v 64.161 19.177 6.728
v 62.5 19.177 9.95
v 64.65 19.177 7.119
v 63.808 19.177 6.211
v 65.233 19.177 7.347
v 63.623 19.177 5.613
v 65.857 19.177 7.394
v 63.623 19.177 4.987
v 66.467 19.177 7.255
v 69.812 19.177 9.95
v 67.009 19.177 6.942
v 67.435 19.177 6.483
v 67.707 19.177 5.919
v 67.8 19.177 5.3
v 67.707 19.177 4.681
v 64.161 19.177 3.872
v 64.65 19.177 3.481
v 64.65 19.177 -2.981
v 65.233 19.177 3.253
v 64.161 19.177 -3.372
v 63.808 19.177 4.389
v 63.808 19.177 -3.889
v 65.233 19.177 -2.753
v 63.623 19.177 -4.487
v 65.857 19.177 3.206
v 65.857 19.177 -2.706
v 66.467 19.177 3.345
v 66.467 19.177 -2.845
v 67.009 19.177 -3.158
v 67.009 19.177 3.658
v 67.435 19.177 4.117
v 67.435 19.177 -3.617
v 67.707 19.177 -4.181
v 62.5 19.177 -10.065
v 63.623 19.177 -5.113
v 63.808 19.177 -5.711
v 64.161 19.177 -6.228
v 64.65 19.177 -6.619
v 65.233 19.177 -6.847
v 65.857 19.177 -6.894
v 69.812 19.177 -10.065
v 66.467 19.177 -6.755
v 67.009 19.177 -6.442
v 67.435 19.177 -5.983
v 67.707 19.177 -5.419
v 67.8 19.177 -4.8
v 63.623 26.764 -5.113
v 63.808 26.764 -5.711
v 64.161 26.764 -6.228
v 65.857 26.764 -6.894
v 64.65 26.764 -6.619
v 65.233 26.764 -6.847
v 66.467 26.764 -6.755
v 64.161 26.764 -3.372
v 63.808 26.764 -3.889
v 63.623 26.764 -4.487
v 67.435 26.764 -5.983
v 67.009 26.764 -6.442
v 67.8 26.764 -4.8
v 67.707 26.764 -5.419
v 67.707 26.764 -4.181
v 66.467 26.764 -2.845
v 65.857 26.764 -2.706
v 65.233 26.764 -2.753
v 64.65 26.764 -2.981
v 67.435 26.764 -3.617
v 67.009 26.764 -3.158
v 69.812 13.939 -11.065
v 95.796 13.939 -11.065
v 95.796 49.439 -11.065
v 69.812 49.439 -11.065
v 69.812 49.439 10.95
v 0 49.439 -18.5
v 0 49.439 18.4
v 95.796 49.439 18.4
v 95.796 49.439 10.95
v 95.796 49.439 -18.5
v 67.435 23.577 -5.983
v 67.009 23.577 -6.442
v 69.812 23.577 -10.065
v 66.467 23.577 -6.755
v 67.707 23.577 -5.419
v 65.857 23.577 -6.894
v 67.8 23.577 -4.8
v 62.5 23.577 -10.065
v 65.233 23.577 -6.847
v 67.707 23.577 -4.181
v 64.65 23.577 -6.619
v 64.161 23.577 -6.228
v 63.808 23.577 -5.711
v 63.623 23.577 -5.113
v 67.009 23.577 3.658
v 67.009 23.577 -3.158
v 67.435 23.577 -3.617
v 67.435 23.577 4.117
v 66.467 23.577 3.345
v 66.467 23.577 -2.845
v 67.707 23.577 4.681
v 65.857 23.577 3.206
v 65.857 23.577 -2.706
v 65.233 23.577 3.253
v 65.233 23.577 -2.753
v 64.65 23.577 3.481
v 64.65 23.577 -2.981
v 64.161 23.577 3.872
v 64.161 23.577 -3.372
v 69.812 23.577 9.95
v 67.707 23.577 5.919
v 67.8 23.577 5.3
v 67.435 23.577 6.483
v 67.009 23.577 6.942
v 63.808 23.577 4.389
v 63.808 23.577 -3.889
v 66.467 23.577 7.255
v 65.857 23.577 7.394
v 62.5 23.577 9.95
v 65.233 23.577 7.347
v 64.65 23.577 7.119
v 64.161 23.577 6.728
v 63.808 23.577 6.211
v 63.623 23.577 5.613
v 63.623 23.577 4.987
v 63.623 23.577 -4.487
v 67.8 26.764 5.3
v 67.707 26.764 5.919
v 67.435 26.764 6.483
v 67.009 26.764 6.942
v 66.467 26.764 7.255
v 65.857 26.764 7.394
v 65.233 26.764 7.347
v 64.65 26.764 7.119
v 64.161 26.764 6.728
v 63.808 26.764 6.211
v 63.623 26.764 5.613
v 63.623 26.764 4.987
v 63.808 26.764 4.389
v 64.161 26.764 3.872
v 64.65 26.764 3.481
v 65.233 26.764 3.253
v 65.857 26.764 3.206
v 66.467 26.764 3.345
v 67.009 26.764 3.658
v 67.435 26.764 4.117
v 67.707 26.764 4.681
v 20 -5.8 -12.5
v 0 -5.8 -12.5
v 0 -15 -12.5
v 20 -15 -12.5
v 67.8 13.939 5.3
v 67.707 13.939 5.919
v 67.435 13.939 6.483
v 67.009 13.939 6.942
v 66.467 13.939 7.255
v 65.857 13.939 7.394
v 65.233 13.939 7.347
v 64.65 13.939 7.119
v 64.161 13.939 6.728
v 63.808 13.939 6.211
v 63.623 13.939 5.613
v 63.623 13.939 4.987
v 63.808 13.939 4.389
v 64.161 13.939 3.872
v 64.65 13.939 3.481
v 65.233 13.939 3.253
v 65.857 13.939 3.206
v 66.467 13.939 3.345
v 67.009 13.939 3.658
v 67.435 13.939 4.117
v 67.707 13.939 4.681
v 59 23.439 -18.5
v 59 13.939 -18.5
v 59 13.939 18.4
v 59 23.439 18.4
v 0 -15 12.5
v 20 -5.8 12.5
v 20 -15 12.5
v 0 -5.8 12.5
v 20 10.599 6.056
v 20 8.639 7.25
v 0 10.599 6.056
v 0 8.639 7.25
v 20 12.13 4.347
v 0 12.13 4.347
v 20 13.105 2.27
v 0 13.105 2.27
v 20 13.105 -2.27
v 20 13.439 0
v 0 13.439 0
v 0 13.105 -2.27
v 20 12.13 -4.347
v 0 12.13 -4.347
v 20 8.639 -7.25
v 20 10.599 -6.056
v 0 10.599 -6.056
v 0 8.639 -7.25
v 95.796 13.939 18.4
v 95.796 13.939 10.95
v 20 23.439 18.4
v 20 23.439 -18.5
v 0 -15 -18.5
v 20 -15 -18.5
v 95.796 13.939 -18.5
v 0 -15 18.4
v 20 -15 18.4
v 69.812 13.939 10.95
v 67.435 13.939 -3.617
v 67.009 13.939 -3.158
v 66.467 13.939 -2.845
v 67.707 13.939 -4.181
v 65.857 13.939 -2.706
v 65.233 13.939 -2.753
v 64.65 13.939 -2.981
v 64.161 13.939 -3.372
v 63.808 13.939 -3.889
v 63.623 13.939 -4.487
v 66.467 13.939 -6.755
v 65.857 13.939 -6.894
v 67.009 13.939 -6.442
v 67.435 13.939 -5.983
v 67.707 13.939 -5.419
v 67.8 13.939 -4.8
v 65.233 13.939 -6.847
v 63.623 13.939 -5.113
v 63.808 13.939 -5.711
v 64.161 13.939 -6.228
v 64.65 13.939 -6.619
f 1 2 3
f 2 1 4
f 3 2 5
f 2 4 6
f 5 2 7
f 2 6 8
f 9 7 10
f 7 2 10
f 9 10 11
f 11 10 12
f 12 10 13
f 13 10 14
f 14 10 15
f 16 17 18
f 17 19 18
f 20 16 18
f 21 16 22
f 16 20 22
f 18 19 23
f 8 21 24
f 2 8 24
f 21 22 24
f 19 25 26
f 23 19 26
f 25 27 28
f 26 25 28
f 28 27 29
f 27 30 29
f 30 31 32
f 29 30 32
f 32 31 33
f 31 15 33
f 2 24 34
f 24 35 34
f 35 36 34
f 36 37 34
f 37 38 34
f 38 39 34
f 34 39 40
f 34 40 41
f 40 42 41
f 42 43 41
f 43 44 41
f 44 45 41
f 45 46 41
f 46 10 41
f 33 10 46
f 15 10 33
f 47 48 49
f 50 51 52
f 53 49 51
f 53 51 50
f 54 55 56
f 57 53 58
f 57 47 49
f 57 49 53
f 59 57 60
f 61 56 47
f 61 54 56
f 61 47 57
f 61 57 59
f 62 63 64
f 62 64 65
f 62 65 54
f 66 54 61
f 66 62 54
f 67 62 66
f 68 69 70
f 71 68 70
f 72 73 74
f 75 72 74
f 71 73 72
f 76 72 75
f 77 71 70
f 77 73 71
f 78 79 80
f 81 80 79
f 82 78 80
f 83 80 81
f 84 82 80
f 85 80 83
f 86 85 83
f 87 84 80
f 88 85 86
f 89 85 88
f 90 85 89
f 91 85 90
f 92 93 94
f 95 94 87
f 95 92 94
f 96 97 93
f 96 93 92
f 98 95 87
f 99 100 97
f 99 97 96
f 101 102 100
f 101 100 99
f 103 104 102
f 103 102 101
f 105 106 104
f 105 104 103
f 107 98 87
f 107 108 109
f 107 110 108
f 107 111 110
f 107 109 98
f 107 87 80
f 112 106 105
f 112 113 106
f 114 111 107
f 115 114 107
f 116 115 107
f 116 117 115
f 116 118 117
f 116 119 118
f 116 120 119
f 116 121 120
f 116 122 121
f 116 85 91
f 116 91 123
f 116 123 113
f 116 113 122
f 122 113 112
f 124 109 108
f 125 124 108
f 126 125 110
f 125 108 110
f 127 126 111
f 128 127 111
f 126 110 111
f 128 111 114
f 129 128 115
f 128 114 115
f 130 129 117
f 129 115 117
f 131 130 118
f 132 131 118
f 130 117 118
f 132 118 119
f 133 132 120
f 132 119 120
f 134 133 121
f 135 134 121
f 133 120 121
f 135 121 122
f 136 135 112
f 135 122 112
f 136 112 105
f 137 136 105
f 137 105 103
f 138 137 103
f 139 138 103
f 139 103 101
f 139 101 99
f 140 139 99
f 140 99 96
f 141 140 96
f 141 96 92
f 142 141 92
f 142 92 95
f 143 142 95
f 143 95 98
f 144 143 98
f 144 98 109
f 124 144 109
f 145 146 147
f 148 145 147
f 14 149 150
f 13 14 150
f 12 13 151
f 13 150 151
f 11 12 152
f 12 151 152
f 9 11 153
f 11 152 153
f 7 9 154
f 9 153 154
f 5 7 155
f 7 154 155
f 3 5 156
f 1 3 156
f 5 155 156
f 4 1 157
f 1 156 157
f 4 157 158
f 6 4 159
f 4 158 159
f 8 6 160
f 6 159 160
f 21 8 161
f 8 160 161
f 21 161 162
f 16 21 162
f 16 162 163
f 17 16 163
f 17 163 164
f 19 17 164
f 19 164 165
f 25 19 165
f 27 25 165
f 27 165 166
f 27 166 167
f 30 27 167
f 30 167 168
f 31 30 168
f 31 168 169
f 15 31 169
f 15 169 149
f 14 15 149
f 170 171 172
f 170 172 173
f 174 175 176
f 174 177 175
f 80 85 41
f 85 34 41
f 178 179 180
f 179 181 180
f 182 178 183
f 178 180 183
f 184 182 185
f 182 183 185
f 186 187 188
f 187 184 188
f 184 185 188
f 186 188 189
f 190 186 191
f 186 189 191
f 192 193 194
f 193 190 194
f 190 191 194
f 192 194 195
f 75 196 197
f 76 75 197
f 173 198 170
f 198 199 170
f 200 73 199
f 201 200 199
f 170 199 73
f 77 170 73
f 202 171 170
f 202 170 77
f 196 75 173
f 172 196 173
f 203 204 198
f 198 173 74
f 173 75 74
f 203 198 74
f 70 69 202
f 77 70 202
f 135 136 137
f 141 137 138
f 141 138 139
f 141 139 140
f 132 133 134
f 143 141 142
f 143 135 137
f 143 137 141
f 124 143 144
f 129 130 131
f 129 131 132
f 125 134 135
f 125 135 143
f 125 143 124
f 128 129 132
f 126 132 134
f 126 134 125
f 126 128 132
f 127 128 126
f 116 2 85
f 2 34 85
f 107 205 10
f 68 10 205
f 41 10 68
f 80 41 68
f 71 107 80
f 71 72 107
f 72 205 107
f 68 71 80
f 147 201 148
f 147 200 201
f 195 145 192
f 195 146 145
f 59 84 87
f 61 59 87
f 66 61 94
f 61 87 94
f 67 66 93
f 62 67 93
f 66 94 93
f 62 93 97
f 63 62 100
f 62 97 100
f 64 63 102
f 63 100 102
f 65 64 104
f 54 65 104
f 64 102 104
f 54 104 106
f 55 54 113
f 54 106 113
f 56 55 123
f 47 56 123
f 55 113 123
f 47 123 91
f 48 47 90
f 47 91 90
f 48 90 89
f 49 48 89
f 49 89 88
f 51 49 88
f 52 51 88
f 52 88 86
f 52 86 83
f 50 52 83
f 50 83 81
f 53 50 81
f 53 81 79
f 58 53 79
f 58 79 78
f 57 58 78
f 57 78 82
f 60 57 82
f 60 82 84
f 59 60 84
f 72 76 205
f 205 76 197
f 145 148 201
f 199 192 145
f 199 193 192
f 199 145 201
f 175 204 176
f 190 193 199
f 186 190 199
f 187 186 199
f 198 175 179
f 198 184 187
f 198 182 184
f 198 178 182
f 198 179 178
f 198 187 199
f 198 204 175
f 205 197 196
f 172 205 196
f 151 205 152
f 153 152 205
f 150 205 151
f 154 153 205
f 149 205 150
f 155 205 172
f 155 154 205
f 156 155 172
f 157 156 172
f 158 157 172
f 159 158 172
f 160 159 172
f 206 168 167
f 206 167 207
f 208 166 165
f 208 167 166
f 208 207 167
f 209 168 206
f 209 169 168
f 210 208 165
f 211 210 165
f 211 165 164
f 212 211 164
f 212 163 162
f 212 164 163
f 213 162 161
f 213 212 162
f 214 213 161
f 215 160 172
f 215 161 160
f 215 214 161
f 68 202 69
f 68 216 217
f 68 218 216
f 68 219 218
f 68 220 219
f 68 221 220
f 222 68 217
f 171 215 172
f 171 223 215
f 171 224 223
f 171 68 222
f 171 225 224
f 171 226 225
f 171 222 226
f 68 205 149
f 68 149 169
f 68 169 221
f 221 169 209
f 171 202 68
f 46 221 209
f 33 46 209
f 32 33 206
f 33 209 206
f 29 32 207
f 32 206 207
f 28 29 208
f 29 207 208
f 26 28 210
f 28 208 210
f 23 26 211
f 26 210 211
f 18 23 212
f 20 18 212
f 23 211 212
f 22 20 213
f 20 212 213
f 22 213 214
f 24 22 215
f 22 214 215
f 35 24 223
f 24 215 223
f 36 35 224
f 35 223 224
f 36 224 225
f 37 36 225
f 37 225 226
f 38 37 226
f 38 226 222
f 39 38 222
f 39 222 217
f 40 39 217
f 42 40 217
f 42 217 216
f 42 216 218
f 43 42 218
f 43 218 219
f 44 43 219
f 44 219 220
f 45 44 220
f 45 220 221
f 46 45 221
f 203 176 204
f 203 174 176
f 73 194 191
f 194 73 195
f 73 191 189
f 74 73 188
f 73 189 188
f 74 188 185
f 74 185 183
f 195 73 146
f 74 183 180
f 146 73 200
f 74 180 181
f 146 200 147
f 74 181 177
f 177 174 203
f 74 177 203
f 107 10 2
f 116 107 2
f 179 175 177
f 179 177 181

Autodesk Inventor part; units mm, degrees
ref_plane "YZ Plane" through (0, 0, 0) normal (1, 0, 0) x (0, 1, 0)
ref_plane "XZ Plane" through (0, 0, 0) normal (0, 1, 0) x (-1, 0, 0)
ref_plane "XY Plane" through (0, 0, 0) normal (0, 0, 1) x (1, 0, 0)
sketch "Sketch1" plane through (0, 0, 0) normal (1, 0, 0) x (0, 1, 0)
  line L0 (-5.8, 12.5) -> (-15, 12.5)
  line L1 (-5.8, -12.5) -> (-15, -12.5)
  line L2 (-5.8, 12.5) -> (8.6392, 7.25)
  line L3 (-5.8, -12.5) -> (8.6392, -7.25)
  arc A0 (8.6392, -7.25) -> (8.6392, 7.25) centre (5.5639, 0) ccw
  line L4 (-15, 12.5) -> (-15, 18.5)
  line L5 (-15, 18.5) -> (23.4392, 18.5)
  line L6 (23.4392, 18.5) -> (23.4392, -18.5)
  line L7 (23.4392, -18.5) -> (-15, -18.5)
  line L8 (-15, -18.5) -> (-15, -12.5)
  line L9 (23.4392, 0) -> (13.4392, 0) construction
  line L10 (13.4392, 0) -> (0, 0) construction
  line L11 (8.6392, -7.25) -> (8.6392, 0) construction
  line L12 (8.6392, 0) -> (8.6392, 7.25) construction
  point P0 (-10.4, 12.5)
  dimension "d0" = 9.2
  dimension "d1" = 25
  dimension "d2" = 12.5
  dimension "d7" = 9.2
  dimension "d8" = 12.5
  dimension "d9" = 15
  dimension "d10" = 15
  dimension "d14" = 6
  dimension "d15" = 6
  dimension "d16" = 37
  dimension "d29" = 10
  dimension "d88" = 4.8
  dimension "d90" = 14.5
  dimension "d91" = 23.4392
extrude "Extrusion1" add sketch "Sketch1" along normal blind 20
sketch "Sketch2" plane through (0, 23.4392, 18.5) normal (0, 1, 0) x (1, 0, 0)
  line L0 (0, 31) -> (0, 37) projected
  line L1 (0, 37) -> (70, 37)
  line L2 (70, 37) -> (70, 0.0995)
  line L3 (70, 0.0995) -> (0, 0.0995)
  line L4 (0, 0.0995) -> (0, 37)
  line L5 (20, 37) -> (20, 0) projected
  point P0 (0, 18.5)
  point P1 (70, 18.5498)
  dimension "d19" = 50
extrude "Extrusion2" add sketch "Sketch2" along normal blind 10
sketch "Sketch3" plane through (0, 23.4392, 18.5) normal (0, -1, 0) x (1, 0, 0)
  line L0 (110.5, -8.5498) -> (110.5, -28.5498)
  line L1 (110.5, -28.5498) -> (70, -28.5498)
  line L2 (70, -28.5498) -> (70, -8.5498)
  line L3 (70, -0.0995) -> (70, -37) projected
  line L4 (110.5, -8.5498) -> (119.5, -8.5498)
  line L5 (119.5, -8.5498) -> (119.5, -37)
  line L6 (119.5, -37) -> (70, -37)
  line L7 (70, -37) -> (0, -37) projected
  line L8 (70, -37) -> (59, -37)
  line L9 (59, -37) -> (59, -8.5498)
  line L10 (59, -8.5498) -> (70, -8.5498)
  point P0 (0, -18.5)
  point P1 (70, -18.5498)
  point P2 (70, -18.5498)
  point P3 (110.5, -18.5498)
  dimension "d22" = 20
  dimension "d23" = 20
  dimension "d24" = 0
  dimension "d25" = 40.5
  dimension "d26" = 9
  dimension "d30" = 11
extrude "Extrusion3" add sketch "Sketch3" along normal blind 9.5 and the other way blind 10
sketch "Sketch4" plane through (0, 33.4392, 18.5) normal (0, 1, 0) x (1, 0, 0)
  line L0 (110.5, 8.5498) -> (119.5, 8.5498) projected
  line L1 (62.5, 28.5653) -> (119.5, 28.5653)
  line L2 (119.5, 28.5653) -> (119.5, 8.5498)
  line L3 (119.5, 8.5498) -> (62.5, 8.5498)
  line L4 (62.5, 8.5498) -> (62.5, 28.5653)
  line L5 (70, 0.0995) -> (70, 28.5498) projected
  line L6 (110.5, 28.5498) -> (110.5, 8.5498) projected
  point P0 (0, 18.5)
  point P1 (70, 14.3246)
  point P2 (110.5, 8.5498)
  dimension "d33" = 7.5
  dimension "d34" = 9
extrude "Extrusion4" cut sketch "Sketch4" against normal blind 14.2625
sketch "Sketch5" plane through (0, 33.4392, 18.5) normal (0, 1, 0) x (1, 0, 0)
  line L0 (62.5, 8.5498) -> (62.5, 28.5653) projected
  line L1 (62.5, 8.5498) -> (70, 8.5498)
  line L2 (70, 8.5498) -> (70, -1.0168)
  line L3 (70, -1.0168) -> (62.5, -1.0168)
  line L4 (62.5, -1.0168) -> (62.5, 8.5498)
  line L5 (70, 0.0995) -> (70, 8.5498) projected
  point P0 (0, 18.5)
  dimension "d47" = 0
extrude "Extrusion5" cut sketch "Sketch5" against normal blind 14.2625
sketch "Sketch7" plane through (59, 13.9392, 9.9502) normal (0, 0, 1) x (1, 0, 0)
  line L0 (3.5, 5.2375) -> (3.5, 9.5) projected
  line L1 (11, 0) -> (11, 5.2375) projected
  line L2 (3.5, 5.2375) -> (11, 5.2375)
  line L3 (11, 5.2375) -> (11, 0)
  line L4 (11, 0) -> (0, 0)
  line L5 (0, 0) -> (0, 9.5)
  line L6 (0, 9.5) -> (3.5, 9.5)
  line L7 (-39, 9.5) -> (3.5, 9.5) projected
  line L8 (3.5, 9.5) -> (3.5, 19.5) projected
  point P0 (-59, -13.9392)
  dimension "d42" = 11
  dimension "d43" = 0
  dimension "d44" = 0
extrude "Extrusion7" add sketch "Sketch7" along normal blind 8.45
sketch "Sketch8" plane through (62.5, 33.4392, 18.4005) normal (1, 0, 0) x (0, 0, -1)
  line L0 (28.4658, 0) -> (28.4658, -14.2625) projected
  line L1 (36.9005, 0) -> (0, 0) projected
  line L2 (28.4658, -9.8625) -> (0, -9.8625)
  line L3 (0, -9.8625) -> (0, 0)
  line L4 (0, 0) -> (28.4658, 0)
  line L5 (28.4658, 0) -> (28.4658, -9.8625)
  line L6 (28.4658, -14.2625) -> (8.4502, -14.2625) projected
  line L7 (8.4502, -14.2625) -> (8.4502, -19.5) projected
  line L8 (0, -10) -> (0, 0) projected
  point P0 (18.4005, -33.4392)
  dimension "d48" = 4.4
  dimension "d52" = 0
extrude "Extrusion8" add sketch "Sketch8" along normal blind 7.5
sketch "Sketch9" plane through (0, 33.4392, 18.5) normal (0, 1, 0) x (1, 0, 0)
  line L0 (59, 37) -> (59, 0.0998) projected
  line L1 (59, 0.0998) -> (59, 37)
  line L2 (119.5, 37) -> (119.5, 8.5498) projected
  line L3 (59, 37) -> (119.5, 37)
  line L4 (70, 28.5653) -> (119.5, 28.5653) projected
  line L5 (119.5, 37) -> (119.5, 28.5653)
  line L6 (119.5, 28.5653) -> (70, 28.5653)
  line L7 (0, 0.0995) -> (70, 0.0995) projected
  line L8 (70, 28.5653) -> (70, 0.0995)
  line L9 (70, 0.0995) -> (59, 0.0998)
  point P0 (0, 18.5)
extrude "Extrusion9" add sketch "Sketch9" along normal blind 16
sketch "Sketch10" plane through (0, 33.4392, 18.5) normal (0, 1, 0) x (1, 0, 0)
  line L0 (59, 0.0998) -> (59, 37) projected
  line L1 (0, 0.0995) -> (70, 0.0995) projected
  line L2 (59, 37) -> (0, 37)
  line L3 (0, 37) -> (0, 0.0995)
  line L4 (0, 0.0995) -> (59, 0.0995)
  line L5 (59, 0.0995) -> (59, 37)
  point P0 (0, 18.5)
  point P1 (59, 0.0995)
extrude "Extrusion10" add sketch "Sketch10" along normal blind 16
sketch "Sketch12" plane through (0, 49.4392, 18.5) normal (0, 1, 0) x (1, 0, 0)
  line L0 (70, 28.5498) -> (70, 0.0998) projected
  line L1 (70, 0.0998) -> (-11.6844, 0.0998)
  line L2 (-11.6844, 0.0998) -> (-11.6844, -16.6848)
  line L3 (-11.6844, -16.6848) -> (70, -16.6848)
  line L4 (70, -16.6848) -> (70, 0.0998)
  point P0 (0, 18.5)
extrude "Extrusion11" cut sketch "Sketch12" against normal blind 76.325
sketch "Sketch13" plane through (0, 19.1767, 18.5) normal (0, 1, 0) x (1, 0, 0)
  line L0 (110.5, 8.5498) -> (110.5, 28.5498) projected
  line L1 (70, 0.0998) -> (70, 28.5653) projected
  line L2 (110.5, 28.5498) -> (70, 28.5498)
  line L3 (70, 28.5498) -> (70, 28.5653)
  line L4 (70, 28.5653) -> (110.5, 28.5653)
  line L5 (110.5, 28.5653) -> (110.5, 28.5498)
  point P0 (0, 18.5)
extrude "Extrusion12" cut sketch "Sketch13" against normal blind 76.325
sketch "Sketch14" plane through (0, 13.9392, 18.5) normal (0, -1, 0) x (1, 0, 0)
  circle A0 centre (114.7, -23.3) radius 2.1
  circle A1 centre (114.7, -13.2) radius 2.1
  line L0 (110.5, -8.5498) -> (110.5, -28.5653) projected
  line L1 (20, -11.25) -> (20, -25.75) projected
  point P0 (0, -18.5)
  point P1 (20, -18.5)
  dimension "d61" = 4.2
  dimension "d62" = 4.2
  dimension "d63" = 10.1
  dimension "d64" = 4.2
  dimension "d65" = 0
  dimension "d66" = 4.8
extrude "Extrusion13" cut sketch "Sketch14" against normal blind 12.825
pattern_linear "Rectangular Pattern1" count 2 spacing 49 along (-1, 0, 0) of "Extrusion13"
sketch "Sketch15" plane through (0, 13.9392, 18.5) normal (0, -1, 0) x (1, 0, 0)
  line L0 (70, -0.0998) -> (70, -28.5653) projected
  line L1 (70, -0.0998) -> (119.5, -0.0998)
  line L2 (119.5, -0.0998) -> (119.5, -8.5498)
  line L3 (119.5, -8.5498) -> (110.5, -8.5498) projected
  line L4 (119.5, -8.5498) -> (110.5, -8.5498)
  line L5 (110.5, -8.5498) -> (68.2571, -8.5498)
  line L6 (68.2571, -8.5498) -> (59, -8.5498)
  line L7 (59, -37) -> (59, -0.0998) projected
  line L8 (59, -0.0998) -> (59, -8.5498)
  line L9 (59, -0.0998) -> (70, -0.0998)
  point P0 (0, -18.5)
extrude "Extrusion14" add sketch "Sketch15" against normal blind 35.5
sketch "Sketch16" plane through (119.5, 13.9392, 18.4002) normal (1, 0, 0) x (0, 0, -1)
  line L0 (7.45, 5.2375) -> (29.4655, 5.2375)
  line L1 (29.4655, 5.2375) -> (29.4655, 38.0522)
  line L2 (29.4655, 38.0522) -> (7.45, 38.0522)
  line L3 (7.45, 38.0522) -> (7.45, 5.2375)
  line L4 (28.4655, 5.2375) -> (8.45, 5.2375) projected
  line L5 (8.45, 5.2375) -> (8.45, 35.5) projected
  line L6 (28.4655, 35.5) -> (28.4655, 5.2375) projected
  point P0 (18.4002, -13.9392)
  dimension "d74" = 0
  dimension "d75" = 1
  dimension "d76" = 1
extrude "Extrusion15" cut sketch "Sketch16" against normal blind 49.6875
sketch "Sketch19" plane through (0, 13.9392, 18.5) normal (0, -1, 0) x (1, 0, 0)
  line L0 (134.9623, 3.6486) -> (95.7961, 3.6486)
  line L1 (95.7961, 3.6486) -> (95.7961, -43.9762)
  line L2 (95.7961, -43.9762) -> (134.9623, -43.9762)
  line L3 (134.9623, -43.9762) -> (134.9623, 3.6486)
  point P0 (0, -18.5)
extrude "Extrusion18" cut sketch "Sketch19" against normal blind 65.5625
sketch "Sketch20" plane through (0, 49.4392, 18.5) normal (0, 1, 0) x (1, 0, 0)
  line L0 (95.7961, 28.5653) -> (95.7961, 29.5653) projected
  line L1 (95.7961, 7.5498) -> (69.8125, 7.5498) projected
  line L2 (95.7961, 29.5653) -> (69.8125, 29.5653)
  line L3 (69.8125, 29.5653) -> (69.8125, 7.5498)
  line L4 (69.8125, 7.5498) -> (95.7961, 7.5498)
  line L5 (95.7961, 7.5498) -> (95.7961, 29.5653)
  point P0 (0, 18.5)
  point P1 (95.7961, 7.5498)
extrude "Extrusion19" cut sketch "Sketch20" against normal blind 65.5625
properties part number "Holder223"
